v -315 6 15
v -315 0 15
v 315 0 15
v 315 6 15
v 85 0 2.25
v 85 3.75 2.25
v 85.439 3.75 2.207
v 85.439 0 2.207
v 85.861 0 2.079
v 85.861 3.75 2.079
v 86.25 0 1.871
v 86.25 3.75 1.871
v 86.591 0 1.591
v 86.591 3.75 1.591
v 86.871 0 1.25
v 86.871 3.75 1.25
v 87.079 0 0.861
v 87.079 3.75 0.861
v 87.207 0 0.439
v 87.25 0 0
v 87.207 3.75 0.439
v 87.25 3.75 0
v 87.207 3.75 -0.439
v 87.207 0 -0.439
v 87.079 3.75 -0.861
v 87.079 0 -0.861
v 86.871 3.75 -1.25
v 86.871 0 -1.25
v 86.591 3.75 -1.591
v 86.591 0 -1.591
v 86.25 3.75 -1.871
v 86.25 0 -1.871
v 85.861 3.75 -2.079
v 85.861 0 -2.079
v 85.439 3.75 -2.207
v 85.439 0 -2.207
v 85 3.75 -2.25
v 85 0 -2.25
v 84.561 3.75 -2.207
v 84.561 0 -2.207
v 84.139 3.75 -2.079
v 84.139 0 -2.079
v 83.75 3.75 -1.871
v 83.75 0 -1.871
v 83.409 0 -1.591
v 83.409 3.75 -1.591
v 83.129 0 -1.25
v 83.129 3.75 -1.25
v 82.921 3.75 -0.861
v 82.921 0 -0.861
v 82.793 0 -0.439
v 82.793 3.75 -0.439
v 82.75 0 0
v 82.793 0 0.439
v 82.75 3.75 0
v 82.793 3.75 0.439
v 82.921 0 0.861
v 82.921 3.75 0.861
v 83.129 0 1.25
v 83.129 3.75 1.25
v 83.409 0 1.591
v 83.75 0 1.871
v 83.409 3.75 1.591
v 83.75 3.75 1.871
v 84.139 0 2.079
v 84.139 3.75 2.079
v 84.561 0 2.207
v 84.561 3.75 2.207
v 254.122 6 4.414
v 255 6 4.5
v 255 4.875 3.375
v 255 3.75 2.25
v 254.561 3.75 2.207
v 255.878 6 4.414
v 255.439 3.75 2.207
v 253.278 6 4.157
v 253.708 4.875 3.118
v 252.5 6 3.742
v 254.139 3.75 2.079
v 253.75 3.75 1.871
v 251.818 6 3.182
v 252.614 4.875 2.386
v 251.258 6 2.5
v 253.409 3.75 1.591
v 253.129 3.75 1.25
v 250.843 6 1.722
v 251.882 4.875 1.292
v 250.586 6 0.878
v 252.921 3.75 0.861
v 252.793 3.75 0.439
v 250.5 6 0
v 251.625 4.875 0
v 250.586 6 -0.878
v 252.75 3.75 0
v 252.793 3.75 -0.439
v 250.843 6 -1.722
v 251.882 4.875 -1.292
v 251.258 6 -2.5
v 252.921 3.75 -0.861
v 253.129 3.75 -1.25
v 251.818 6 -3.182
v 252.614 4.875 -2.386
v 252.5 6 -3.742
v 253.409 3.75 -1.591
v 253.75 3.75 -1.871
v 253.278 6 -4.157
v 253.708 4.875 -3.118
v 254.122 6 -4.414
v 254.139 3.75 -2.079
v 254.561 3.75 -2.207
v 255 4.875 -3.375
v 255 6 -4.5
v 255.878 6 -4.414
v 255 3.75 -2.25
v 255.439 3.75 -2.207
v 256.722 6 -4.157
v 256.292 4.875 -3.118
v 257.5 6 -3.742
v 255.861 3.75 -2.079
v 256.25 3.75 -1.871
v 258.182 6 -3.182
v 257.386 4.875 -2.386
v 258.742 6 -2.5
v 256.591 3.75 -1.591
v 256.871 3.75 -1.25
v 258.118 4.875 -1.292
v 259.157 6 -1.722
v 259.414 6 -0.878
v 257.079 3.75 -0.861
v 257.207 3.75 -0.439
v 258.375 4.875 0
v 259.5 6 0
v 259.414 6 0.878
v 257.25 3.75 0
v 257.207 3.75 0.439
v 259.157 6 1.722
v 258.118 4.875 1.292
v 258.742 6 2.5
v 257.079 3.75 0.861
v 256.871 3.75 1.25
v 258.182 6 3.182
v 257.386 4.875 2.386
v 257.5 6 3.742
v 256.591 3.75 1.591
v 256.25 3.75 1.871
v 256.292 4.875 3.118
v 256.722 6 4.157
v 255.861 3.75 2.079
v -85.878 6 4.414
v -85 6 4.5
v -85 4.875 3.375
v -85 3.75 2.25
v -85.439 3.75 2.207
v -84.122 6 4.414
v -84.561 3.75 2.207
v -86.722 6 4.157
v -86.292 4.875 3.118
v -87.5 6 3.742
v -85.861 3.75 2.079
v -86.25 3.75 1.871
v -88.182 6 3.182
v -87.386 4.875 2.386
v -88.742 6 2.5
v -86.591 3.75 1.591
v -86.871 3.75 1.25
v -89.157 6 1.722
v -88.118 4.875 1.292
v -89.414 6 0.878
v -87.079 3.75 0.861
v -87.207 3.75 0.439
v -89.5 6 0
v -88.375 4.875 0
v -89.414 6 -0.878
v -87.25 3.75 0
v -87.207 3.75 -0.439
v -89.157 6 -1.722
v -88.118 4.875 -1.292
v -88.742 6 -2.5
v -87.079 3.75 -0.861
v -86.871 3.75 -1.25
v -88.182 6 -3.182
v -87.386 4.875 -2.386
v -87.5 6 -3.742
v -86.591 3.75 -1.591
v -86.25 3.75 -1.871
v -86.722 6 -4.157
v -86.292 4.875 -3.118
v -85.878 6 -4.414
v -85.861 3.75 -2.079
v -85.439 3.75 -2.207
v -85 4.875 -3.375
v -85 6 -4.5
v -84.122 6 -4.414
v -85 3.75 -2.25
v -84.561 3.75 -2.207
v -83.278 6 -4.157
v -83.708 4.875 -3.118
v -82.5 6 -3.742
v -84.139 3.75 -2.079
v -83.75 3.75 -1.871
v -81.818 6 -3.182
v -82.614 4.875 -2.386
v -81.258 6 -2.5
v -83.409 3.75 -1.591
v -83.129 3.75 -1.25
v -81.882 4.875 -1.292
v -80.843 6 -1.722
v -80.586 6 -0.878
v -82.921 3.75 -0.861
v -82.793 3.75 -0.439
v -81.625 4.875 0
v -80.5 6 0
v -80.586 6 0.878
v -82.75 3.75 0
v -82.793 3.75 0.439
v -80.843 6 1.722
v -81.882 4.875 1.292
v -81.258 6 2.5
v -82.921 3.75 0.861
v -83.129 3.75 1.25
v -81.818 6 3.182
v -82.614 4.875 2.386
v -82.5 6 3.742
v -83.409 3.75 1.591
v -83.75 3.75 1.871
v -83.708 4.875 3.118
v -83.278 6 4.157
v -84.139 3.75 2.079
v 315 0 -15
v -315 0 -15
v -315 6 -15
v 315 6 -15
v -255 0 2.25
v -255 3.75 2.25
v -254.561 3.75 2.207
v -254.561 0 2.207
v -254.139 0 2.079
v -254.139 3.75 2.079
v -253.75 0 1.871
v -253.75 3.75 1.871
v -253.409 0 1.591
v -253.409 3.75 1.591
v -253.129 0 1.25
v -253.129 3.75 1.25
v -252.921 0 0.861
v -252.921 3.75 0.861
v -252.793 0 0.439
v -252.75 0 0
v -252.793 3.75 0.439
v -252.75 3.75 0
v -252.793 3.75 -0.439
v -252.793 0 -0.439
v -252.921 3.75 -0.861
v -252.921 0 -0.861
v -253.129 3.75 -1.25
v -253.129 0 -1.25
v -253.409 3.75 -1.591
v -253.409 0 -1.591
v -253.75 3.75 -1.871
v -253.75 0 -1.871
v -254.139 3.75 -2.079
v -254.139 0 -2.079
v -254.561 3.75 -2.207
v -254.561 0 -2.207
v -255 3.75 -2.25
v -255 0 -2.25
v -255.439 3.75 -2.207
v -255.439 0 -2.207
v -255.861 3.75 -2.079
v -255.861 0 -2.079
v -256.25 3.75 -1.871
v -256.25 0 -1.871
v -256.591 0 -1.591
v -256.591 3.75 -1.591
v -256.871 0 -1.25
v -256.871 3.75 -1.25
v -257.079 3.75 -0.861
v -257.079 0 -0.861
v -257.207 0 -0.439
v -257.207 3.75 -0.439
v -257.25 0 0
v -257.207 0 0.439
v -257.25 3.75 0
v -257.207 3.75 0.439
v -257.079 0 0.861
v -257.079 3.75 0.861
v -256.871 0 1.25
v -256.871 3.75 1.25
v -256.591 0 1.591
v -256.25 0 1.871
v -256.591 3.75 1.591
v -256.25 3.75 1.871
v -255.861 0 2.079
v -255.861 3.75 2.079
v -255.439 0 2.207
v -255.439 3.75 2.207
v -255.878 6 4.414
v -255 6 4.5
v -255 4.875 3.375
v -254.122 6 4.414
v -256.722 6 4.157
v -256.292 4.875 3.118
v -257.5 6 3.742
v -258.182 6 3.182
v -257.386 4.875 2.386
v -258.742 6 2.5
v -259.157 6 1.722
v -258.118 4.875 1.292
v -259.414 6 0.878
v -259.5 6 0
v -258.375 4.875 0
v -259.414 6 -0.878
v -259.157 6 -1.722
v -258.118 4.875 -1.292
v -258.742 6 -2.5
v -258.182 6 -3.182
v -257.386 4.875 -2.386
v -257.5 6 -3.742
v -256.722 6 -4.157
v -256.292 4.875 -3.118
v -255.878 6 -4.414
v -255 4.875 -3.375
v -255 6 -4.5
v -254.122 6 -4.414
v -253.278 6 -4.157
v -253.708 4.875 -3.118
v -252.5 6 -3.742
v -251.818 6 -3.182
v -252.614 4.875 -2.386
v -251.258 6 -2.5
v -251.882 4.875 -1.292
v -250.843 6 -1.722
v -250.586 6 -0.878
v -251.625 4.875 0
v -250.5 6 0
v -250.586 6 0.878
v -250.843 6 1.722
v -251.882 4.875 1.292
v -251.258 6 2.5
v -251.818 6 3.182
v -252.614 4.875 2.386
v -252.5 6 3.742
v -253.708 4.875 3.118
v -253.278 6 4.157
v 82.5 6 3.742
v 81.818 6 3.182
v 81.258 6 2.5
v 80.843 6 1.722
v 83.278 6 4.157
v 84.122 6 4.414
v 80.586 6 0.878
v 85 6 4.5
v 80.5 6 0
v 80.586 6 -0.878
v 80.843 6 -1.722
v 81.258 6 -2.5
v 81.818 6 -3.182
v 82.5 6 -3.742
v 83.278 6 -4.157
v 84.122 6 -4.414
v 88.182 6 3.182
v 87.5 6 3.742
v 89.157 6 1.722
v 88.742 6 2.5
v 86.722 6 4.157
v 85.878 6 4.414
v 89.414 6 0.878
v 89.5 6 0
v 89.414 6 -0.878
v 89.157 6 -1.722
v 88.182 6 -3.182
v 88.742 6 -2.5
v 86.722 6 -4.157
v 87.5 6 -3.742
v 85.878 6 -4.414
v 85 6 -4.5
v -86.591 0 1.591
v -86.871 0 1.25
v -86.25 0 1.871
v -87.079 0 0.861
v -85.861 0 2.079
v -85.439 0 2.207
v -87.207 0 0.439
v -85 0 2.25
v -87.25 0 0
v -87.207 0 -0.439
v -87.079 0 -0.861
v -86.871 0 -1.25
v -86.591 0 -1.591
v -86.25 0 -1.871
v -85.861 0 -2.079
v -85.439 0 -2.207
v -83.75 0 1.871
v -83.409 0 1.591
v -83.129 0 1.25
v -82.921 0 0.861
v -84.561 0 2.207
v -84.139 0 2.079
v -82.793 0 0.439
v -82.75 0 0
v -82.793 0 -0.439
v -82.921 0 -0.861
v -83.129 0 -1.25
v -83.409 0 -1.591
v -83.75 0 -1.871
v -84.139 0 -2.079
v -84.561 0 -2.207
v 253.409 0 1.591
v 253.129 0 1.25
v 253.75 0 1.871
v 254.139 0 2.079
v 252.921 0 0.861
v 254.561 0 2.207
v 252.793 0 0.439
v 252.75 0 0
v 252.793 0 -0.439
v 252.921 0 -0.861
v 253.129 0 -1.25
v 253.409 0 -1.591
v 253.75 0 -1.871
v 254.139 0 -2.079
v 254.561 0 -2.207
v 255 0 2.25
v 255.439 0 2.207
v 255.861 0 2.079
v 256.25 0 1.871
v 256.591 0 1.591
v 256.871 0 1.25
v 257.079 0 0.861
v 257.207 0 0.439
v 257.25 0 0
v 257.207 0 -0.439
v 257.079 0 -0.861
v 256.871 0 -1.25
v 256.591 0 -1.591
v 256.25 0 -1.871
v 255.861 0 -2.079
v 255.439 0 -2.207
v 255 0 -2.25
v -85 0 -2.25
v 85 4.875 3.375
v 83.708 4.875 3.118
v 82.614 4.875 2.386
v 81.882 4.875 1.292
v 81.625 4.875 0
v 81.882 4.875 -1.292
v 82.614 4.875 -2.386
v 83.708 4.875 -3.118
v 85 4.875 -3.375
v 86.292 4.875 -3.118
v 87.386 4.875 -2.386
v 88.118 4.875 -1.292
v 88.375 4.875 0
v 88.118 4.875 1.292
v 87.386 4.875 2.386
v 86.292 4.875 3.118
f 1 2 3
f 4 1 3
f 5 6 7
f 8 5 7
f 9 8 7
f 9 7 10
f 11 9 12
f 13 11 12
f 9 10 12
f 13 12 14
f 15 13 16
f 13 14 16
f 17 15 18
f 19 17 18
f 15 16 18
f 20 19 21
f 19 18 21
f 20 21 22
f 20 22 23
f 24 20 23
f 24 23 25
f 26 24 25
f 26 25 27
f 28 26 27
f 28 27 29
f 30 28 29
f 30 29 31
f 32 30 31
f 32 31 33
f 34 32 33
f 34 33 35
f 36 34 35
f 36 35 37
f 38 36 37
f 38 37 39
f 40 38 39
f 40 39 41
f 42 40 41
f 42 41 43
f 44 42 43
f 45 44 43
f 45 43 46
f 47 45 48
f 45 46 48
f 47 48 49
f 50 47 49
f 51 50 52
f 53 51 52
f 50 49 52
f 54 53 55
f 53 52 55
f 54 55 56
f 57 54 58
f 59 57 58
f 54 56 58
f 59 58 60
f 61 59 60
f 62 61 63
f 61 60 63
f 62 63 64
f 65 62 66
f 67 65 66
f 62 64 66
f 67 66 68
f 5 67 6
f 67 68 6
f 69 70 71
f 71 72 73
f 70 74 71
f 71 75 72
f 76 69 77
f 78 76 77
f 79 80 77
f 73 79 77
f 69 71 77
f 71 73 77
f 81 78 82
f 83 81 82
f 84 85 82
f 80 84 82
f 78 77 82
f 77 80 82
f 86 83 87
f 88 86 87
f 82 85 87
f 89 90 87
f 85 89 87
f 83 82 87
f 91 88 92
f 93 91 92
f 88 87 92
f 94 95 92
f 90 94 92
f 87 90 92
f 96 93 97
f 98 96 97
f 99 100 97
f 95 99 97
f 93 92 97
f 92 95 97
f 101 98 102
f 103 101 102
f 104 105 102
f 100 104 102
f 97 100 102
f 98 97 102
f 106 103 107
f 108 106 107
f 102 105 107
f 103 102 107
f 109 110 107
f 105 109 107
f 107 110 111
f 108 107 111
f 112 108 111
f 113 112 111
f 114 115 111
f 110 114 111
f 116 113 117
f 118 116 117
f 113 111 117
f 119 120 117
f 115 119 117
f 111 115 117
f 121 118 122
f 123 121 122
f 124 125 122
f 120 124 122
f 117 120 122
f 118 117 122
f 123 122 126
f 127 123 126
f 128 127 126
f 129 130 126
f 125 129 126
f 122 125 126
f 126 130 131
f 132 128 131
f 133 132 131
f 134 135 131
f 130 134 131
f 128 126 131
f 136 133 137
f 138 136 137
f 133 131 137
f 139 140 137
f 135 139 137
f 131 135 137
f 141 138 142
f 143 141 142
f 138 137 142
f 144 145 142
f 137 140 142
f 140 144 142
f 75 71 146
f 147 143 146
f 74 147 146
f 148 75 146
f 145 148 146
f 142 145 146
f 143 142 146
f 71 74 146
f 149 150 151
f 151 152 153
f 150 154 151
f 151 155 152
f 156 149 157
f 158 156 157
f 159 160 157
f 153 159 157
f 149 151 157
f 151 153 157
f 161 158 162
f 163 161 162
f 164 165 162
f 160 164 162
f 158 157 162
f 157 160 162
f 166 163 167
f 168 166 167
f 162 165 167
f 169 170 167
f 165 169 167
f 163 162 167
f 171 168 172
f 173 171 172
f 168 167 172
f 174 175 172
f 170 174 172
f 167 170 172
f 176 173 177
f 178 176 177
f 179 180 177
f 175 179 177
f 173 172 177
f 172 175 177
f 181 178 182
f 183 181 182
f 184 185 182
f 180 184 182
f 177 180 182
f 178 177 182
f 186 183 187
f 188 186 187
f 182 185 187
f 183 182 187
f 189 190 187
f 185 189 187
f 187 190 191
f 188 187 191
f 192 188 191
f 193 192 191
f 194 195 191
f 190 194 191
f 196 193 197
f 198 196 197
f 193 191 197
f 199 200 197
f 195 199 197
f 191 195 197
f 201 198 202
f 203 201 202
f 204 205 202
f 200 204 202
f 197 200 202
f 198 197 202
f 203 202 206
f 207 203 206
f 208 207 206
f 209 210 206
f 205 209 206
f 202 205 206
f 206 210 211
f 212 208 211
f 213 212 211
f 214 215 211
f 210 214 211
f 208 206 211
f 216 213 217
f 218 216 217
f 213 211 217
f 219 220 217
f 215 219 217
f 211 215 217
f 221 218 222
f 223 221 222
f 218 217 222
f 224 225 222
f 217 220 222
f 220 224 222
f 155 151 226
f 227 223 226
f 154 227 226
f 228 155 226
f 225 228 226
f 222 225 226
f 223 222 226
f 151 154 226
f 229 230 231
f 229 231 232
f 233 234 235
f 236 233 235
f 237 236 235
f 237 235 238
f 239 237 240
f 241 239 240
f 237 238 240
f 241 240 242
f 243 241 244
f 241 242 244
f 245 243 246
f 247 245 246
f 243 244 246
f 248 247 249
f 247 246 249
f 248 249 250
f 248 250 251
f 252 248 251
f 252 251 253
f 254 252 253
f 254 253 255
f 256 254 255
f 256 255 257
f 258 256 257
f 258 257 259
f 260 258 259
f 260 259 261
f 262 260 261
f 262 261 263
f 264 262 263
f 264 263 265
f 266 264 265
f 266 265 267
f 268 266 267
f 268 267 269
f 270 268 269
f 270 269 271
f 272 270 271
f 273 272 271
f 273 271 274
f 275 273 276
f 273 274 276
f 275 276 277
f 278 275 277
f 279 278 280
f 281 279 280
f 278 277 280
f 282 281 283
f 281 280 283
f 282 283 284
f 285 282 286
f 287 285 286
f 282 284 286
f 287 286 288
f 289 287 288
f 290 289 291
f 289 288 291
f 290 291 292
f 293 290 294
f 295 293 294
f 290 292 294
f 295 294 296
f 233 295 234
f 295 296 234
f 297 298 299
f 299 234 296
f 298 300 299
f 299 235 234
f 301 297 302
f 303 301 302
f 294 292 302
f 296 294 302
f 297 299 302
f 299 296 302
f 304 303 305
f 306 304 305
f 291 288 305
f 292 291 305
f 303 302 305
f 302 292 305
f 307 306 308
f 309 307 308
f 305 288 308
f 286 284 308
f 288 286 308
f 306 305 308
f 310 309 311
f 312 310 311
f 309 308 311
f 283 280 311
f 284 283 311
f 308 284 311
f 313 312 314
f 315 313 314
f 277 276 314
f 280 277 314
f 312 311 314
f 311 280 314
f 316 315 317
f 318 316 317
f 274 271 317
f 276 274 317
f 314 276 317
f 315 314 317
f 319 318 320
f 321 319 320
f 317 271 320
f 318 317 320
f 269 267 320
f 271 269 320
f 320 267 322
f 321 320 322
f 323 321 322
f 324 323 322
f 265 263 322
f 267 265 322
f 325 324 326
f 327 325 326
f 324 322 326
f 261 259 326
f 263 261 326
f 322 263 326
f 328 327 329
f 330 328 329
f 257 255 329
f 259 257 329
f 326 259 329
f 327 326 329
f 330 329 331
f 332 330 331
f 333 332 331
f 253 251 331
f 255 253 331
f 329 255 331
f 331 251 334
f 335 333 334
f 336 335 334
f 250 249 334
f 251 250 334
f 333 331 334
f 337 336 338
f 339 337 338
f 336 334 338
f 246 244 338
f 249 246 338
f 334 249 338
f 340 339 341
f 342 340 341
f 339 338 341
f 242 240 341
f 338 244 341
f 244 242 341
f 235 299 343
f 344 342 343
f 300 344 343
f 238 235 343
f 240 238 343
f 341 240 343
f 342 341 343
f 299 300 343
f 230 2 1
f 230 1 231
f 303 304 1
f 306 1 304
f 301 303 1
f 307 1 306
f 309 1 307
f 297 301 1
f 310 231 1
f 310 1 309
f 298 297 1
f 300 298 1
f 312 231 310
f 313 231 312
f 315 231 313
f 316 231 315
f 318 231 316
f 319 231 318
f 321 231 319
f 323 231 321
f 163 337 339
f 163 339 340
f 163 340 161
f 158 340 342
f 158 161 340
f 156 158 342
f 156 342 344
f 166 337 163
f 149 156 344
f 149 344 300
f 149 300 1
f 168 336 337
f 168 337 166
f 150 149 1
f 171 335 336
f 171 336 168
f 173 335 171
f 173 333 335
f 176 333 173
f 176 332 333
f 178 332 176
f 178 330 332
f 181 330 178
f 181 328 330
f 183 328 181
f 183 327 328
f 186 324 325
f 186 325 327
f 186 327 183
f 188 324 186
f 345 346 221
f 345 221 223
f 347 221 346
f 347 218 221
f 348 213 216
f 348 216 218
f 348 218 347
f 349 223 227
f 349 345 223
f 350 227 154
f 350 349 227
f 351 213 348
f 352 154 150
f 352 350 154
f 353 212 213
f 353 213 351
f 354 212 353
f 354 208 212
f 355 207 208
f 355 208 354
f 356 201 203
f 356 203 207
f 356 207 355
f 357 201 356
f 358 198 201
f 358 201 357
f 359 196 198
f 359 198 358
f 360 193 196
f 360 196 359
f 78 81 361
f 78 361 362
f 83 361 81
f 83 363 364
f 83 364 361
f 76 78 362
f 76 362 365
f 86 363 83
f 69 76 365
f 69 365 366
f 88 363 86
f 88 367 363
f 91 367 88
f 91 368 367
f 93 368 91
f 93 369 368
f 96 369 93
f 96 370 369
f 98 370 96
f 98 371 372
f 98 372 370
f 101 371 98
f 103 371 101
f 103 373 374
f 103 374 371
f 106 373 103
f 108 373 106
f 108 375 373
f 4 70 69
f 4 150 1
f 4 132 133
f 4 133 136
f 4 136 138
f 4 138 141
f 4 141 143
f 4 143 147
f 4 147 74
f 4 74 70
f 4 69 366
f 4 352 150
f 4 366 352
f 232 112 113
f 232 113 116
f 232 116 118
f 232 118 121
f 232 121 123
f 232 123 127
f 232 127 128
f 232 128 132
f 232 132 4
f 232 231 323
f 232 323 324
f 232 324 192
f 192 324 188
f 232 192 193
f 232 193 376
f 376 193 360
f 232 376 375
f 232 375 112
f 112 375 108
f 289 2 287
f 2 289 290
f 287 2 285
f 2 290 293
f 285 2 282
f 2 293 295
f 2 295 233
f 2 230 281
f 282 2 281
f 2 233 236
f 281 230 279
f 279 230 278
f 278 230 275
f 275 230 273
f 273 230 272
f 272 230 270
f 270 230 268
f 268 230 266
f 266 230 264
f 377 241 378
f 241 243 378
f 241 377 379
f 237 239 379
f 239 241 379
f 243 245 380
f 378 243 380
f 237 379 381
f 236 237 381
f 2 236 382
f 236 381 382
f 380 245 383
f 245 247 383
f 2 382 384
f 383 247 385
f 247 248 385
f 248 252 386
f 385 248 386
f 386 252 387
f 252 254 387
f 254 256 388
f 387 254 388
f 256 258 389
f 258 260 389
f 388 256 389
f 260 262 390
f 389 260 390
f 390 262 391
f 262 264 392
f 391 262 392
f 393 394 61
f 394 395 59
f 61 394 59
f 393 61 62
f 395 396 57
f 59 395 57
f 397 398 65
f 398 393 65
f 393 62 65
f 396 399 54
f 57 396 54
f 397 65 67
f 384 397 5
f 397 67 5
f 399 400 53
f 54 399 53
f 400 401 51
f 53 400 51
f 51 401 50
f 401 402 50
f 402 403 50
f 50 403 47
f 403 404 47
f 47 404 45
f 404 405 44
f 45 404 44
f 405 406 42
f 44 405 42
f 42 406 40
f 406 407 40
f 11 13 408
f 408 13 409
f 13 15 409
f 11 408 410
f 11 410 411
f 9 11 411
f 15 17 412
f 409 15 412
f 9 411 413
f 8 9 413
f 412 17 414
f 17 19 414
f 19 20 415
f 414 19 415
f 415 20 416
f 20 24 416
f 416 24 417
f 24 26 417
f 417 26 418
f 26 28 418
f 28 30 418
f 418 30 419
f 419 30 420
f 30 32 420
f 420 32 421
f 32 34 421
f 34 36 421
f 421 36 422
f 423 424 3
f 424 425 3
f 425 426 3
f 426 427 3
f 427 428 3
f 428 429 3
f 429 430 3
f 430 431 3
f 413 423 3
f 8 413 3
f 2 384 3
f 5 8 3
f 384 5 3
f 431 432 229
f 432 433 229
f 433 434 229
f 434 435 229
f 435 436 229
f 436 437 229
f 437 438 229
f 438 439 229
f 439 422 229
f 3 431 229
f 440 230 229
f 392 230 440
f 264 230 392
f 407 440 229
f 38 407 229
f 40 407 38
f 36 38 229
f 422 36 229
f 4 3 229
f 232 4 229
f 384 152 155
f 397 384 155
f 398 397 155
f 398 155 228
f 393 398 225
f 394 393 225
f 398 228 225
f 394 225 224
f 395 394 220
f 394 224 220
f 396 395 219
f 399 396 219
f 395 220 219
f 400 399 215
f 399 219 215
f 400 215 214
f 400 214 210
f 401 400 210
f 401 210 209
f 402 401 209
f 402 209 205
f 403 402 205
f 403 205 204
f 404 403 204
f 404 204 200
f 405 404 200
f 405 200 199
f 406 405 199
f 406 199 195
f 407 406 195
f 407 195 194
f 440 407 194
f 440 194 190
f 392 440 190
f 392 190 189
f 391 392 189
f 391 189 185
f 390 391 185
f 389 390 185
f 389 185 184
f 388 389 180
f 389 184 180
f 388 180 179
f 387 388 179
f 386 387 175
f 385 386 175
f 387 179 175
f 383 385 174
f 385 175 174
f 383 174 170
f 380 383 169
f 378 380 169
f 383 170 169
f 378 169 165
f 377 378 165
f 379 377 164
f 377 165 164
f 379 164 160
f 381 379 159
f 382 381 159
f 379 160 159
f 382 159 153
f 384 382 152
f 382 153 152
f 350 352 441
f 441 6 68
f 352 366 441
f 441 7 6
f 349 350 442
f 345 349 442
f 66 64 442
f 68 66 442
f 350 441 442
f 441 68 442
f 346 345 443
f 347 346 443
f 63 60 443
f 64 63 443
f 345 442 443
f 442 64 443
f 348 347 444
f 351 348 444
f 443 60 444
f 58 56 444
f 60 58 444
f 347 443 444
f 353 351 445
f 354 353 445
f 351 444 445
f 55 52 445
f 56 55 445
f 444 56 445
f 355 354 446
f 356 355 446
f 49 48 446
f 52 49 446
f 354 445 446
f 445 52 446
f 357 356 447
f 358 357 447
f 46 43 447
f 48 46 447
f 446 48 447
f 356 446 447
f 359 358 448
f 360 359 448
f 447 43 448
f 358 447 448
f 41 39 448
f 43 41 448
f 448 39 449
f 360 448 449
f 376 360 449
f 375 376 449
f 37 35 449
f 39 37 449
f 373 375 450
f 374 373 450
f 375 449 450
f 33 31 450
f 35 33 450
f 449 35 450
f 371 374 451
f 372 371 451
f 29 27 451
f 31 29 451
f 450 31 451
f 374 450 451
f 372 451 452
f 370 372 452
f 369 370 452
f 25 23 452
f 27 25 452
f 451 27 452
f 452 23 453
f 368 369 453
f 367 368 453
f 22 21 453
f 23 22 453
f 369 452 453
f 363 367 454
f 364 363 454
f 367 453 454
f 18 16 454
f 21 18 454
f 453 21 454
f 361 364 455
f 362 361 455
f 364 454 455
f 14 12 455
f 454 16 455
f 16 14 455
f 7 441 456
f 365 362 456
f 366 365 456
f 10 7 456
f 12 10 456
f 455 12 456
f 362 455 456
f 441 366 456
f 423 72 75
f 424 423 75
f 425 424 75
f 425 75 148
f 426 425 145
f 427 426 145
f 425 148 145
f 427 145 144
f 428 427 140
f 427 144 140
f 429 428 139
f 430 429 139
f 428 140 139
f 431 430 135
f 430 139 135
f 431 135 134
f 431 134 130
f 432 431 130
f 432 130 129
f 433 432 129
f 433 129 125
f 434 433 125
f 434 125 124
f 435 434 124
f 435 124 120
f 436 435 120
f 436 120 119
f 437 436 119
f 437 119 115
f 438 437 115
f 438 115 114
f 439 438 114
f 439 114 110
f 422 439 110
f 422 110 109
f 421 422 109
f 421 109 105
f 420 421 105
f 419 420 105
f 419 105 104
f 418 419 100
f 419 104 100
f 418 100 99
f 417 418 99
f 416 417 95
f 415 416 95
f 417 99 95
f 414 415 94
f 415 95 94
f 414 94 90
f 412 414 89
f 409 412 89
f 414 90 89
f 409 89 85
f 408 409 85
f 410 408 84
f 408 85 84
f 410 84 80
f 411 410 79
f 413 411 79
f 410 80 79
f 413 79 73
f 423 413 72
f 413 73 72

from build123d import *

# Parameters (mm, degrees)
SKETCH1_W           = 630
SKETCH1_H           = 30
BOSS_EXTRUDE1_DEPTH = 6
SKETCH4_R           = 2.25
CUT_EXTRUDE1_DEPTH  = 316.414013639
LPATTERN2_COUNT     = 4
LPATTERN2_PITCH     = 170


with BuildPart() as part:
    # Sketch1 → Boss-Extrude1 (new body)
    with BuildSketch(Plane(origin=(0, 0, 0), x_dir=(1, 0, 0), z_dir=(0, 1, 0))):
        Rectangle(SKETCH1_W, SKETCH1_H)
    extrude(amount=BOSS_EXTRUDE1_DEPTH)

    # Sketch4 → Cut-Extrude1 (cut, through all)
    with BuildSketch(Plane(origin=(0, 6, 0), x_dir=(1, 0, 0), z_dir=(0, 1, 0))):
        with Locations(Location((-255, 0, 0), (0, 0, 270))):
            Circle(SKETCH4_R)
    cut_extrude1 = extrude(amount=-CUT_EXTRUDE1_DEPTH, mode=Mode.SUBTRACT)

    # Cut-Extrude2 cone 1 section (through the dimple's axis) → Cut-Extrude2 (revolve, cut)
    with BuildSketch(Plane(origin=(-255, 6, 0), x_dir=(0, 0, 1), z_dir=(1, 0, 0))):
        Polygon((0, 0), (4.5, 0), (0, 4.5), align=None)
    cut_extrude2 = revolve(axis=Axis((-255, 6, 0), (0, -1, 0)), mode=Mode.SUBTRACT)

    # LPattern2: Cut-Extrude1, Cut-Extrude2 ×4
    with Locations(*[(i * LPATTERN2_PITCH, 0, 0) for i in range(1, LPATTERN2_COUNT)]):
        add(cut_extrude1, mode=Mode.SUBTRACT)
        add(cut_extrude2, mode=Mode.SUBTRACT)


solid = part.part
